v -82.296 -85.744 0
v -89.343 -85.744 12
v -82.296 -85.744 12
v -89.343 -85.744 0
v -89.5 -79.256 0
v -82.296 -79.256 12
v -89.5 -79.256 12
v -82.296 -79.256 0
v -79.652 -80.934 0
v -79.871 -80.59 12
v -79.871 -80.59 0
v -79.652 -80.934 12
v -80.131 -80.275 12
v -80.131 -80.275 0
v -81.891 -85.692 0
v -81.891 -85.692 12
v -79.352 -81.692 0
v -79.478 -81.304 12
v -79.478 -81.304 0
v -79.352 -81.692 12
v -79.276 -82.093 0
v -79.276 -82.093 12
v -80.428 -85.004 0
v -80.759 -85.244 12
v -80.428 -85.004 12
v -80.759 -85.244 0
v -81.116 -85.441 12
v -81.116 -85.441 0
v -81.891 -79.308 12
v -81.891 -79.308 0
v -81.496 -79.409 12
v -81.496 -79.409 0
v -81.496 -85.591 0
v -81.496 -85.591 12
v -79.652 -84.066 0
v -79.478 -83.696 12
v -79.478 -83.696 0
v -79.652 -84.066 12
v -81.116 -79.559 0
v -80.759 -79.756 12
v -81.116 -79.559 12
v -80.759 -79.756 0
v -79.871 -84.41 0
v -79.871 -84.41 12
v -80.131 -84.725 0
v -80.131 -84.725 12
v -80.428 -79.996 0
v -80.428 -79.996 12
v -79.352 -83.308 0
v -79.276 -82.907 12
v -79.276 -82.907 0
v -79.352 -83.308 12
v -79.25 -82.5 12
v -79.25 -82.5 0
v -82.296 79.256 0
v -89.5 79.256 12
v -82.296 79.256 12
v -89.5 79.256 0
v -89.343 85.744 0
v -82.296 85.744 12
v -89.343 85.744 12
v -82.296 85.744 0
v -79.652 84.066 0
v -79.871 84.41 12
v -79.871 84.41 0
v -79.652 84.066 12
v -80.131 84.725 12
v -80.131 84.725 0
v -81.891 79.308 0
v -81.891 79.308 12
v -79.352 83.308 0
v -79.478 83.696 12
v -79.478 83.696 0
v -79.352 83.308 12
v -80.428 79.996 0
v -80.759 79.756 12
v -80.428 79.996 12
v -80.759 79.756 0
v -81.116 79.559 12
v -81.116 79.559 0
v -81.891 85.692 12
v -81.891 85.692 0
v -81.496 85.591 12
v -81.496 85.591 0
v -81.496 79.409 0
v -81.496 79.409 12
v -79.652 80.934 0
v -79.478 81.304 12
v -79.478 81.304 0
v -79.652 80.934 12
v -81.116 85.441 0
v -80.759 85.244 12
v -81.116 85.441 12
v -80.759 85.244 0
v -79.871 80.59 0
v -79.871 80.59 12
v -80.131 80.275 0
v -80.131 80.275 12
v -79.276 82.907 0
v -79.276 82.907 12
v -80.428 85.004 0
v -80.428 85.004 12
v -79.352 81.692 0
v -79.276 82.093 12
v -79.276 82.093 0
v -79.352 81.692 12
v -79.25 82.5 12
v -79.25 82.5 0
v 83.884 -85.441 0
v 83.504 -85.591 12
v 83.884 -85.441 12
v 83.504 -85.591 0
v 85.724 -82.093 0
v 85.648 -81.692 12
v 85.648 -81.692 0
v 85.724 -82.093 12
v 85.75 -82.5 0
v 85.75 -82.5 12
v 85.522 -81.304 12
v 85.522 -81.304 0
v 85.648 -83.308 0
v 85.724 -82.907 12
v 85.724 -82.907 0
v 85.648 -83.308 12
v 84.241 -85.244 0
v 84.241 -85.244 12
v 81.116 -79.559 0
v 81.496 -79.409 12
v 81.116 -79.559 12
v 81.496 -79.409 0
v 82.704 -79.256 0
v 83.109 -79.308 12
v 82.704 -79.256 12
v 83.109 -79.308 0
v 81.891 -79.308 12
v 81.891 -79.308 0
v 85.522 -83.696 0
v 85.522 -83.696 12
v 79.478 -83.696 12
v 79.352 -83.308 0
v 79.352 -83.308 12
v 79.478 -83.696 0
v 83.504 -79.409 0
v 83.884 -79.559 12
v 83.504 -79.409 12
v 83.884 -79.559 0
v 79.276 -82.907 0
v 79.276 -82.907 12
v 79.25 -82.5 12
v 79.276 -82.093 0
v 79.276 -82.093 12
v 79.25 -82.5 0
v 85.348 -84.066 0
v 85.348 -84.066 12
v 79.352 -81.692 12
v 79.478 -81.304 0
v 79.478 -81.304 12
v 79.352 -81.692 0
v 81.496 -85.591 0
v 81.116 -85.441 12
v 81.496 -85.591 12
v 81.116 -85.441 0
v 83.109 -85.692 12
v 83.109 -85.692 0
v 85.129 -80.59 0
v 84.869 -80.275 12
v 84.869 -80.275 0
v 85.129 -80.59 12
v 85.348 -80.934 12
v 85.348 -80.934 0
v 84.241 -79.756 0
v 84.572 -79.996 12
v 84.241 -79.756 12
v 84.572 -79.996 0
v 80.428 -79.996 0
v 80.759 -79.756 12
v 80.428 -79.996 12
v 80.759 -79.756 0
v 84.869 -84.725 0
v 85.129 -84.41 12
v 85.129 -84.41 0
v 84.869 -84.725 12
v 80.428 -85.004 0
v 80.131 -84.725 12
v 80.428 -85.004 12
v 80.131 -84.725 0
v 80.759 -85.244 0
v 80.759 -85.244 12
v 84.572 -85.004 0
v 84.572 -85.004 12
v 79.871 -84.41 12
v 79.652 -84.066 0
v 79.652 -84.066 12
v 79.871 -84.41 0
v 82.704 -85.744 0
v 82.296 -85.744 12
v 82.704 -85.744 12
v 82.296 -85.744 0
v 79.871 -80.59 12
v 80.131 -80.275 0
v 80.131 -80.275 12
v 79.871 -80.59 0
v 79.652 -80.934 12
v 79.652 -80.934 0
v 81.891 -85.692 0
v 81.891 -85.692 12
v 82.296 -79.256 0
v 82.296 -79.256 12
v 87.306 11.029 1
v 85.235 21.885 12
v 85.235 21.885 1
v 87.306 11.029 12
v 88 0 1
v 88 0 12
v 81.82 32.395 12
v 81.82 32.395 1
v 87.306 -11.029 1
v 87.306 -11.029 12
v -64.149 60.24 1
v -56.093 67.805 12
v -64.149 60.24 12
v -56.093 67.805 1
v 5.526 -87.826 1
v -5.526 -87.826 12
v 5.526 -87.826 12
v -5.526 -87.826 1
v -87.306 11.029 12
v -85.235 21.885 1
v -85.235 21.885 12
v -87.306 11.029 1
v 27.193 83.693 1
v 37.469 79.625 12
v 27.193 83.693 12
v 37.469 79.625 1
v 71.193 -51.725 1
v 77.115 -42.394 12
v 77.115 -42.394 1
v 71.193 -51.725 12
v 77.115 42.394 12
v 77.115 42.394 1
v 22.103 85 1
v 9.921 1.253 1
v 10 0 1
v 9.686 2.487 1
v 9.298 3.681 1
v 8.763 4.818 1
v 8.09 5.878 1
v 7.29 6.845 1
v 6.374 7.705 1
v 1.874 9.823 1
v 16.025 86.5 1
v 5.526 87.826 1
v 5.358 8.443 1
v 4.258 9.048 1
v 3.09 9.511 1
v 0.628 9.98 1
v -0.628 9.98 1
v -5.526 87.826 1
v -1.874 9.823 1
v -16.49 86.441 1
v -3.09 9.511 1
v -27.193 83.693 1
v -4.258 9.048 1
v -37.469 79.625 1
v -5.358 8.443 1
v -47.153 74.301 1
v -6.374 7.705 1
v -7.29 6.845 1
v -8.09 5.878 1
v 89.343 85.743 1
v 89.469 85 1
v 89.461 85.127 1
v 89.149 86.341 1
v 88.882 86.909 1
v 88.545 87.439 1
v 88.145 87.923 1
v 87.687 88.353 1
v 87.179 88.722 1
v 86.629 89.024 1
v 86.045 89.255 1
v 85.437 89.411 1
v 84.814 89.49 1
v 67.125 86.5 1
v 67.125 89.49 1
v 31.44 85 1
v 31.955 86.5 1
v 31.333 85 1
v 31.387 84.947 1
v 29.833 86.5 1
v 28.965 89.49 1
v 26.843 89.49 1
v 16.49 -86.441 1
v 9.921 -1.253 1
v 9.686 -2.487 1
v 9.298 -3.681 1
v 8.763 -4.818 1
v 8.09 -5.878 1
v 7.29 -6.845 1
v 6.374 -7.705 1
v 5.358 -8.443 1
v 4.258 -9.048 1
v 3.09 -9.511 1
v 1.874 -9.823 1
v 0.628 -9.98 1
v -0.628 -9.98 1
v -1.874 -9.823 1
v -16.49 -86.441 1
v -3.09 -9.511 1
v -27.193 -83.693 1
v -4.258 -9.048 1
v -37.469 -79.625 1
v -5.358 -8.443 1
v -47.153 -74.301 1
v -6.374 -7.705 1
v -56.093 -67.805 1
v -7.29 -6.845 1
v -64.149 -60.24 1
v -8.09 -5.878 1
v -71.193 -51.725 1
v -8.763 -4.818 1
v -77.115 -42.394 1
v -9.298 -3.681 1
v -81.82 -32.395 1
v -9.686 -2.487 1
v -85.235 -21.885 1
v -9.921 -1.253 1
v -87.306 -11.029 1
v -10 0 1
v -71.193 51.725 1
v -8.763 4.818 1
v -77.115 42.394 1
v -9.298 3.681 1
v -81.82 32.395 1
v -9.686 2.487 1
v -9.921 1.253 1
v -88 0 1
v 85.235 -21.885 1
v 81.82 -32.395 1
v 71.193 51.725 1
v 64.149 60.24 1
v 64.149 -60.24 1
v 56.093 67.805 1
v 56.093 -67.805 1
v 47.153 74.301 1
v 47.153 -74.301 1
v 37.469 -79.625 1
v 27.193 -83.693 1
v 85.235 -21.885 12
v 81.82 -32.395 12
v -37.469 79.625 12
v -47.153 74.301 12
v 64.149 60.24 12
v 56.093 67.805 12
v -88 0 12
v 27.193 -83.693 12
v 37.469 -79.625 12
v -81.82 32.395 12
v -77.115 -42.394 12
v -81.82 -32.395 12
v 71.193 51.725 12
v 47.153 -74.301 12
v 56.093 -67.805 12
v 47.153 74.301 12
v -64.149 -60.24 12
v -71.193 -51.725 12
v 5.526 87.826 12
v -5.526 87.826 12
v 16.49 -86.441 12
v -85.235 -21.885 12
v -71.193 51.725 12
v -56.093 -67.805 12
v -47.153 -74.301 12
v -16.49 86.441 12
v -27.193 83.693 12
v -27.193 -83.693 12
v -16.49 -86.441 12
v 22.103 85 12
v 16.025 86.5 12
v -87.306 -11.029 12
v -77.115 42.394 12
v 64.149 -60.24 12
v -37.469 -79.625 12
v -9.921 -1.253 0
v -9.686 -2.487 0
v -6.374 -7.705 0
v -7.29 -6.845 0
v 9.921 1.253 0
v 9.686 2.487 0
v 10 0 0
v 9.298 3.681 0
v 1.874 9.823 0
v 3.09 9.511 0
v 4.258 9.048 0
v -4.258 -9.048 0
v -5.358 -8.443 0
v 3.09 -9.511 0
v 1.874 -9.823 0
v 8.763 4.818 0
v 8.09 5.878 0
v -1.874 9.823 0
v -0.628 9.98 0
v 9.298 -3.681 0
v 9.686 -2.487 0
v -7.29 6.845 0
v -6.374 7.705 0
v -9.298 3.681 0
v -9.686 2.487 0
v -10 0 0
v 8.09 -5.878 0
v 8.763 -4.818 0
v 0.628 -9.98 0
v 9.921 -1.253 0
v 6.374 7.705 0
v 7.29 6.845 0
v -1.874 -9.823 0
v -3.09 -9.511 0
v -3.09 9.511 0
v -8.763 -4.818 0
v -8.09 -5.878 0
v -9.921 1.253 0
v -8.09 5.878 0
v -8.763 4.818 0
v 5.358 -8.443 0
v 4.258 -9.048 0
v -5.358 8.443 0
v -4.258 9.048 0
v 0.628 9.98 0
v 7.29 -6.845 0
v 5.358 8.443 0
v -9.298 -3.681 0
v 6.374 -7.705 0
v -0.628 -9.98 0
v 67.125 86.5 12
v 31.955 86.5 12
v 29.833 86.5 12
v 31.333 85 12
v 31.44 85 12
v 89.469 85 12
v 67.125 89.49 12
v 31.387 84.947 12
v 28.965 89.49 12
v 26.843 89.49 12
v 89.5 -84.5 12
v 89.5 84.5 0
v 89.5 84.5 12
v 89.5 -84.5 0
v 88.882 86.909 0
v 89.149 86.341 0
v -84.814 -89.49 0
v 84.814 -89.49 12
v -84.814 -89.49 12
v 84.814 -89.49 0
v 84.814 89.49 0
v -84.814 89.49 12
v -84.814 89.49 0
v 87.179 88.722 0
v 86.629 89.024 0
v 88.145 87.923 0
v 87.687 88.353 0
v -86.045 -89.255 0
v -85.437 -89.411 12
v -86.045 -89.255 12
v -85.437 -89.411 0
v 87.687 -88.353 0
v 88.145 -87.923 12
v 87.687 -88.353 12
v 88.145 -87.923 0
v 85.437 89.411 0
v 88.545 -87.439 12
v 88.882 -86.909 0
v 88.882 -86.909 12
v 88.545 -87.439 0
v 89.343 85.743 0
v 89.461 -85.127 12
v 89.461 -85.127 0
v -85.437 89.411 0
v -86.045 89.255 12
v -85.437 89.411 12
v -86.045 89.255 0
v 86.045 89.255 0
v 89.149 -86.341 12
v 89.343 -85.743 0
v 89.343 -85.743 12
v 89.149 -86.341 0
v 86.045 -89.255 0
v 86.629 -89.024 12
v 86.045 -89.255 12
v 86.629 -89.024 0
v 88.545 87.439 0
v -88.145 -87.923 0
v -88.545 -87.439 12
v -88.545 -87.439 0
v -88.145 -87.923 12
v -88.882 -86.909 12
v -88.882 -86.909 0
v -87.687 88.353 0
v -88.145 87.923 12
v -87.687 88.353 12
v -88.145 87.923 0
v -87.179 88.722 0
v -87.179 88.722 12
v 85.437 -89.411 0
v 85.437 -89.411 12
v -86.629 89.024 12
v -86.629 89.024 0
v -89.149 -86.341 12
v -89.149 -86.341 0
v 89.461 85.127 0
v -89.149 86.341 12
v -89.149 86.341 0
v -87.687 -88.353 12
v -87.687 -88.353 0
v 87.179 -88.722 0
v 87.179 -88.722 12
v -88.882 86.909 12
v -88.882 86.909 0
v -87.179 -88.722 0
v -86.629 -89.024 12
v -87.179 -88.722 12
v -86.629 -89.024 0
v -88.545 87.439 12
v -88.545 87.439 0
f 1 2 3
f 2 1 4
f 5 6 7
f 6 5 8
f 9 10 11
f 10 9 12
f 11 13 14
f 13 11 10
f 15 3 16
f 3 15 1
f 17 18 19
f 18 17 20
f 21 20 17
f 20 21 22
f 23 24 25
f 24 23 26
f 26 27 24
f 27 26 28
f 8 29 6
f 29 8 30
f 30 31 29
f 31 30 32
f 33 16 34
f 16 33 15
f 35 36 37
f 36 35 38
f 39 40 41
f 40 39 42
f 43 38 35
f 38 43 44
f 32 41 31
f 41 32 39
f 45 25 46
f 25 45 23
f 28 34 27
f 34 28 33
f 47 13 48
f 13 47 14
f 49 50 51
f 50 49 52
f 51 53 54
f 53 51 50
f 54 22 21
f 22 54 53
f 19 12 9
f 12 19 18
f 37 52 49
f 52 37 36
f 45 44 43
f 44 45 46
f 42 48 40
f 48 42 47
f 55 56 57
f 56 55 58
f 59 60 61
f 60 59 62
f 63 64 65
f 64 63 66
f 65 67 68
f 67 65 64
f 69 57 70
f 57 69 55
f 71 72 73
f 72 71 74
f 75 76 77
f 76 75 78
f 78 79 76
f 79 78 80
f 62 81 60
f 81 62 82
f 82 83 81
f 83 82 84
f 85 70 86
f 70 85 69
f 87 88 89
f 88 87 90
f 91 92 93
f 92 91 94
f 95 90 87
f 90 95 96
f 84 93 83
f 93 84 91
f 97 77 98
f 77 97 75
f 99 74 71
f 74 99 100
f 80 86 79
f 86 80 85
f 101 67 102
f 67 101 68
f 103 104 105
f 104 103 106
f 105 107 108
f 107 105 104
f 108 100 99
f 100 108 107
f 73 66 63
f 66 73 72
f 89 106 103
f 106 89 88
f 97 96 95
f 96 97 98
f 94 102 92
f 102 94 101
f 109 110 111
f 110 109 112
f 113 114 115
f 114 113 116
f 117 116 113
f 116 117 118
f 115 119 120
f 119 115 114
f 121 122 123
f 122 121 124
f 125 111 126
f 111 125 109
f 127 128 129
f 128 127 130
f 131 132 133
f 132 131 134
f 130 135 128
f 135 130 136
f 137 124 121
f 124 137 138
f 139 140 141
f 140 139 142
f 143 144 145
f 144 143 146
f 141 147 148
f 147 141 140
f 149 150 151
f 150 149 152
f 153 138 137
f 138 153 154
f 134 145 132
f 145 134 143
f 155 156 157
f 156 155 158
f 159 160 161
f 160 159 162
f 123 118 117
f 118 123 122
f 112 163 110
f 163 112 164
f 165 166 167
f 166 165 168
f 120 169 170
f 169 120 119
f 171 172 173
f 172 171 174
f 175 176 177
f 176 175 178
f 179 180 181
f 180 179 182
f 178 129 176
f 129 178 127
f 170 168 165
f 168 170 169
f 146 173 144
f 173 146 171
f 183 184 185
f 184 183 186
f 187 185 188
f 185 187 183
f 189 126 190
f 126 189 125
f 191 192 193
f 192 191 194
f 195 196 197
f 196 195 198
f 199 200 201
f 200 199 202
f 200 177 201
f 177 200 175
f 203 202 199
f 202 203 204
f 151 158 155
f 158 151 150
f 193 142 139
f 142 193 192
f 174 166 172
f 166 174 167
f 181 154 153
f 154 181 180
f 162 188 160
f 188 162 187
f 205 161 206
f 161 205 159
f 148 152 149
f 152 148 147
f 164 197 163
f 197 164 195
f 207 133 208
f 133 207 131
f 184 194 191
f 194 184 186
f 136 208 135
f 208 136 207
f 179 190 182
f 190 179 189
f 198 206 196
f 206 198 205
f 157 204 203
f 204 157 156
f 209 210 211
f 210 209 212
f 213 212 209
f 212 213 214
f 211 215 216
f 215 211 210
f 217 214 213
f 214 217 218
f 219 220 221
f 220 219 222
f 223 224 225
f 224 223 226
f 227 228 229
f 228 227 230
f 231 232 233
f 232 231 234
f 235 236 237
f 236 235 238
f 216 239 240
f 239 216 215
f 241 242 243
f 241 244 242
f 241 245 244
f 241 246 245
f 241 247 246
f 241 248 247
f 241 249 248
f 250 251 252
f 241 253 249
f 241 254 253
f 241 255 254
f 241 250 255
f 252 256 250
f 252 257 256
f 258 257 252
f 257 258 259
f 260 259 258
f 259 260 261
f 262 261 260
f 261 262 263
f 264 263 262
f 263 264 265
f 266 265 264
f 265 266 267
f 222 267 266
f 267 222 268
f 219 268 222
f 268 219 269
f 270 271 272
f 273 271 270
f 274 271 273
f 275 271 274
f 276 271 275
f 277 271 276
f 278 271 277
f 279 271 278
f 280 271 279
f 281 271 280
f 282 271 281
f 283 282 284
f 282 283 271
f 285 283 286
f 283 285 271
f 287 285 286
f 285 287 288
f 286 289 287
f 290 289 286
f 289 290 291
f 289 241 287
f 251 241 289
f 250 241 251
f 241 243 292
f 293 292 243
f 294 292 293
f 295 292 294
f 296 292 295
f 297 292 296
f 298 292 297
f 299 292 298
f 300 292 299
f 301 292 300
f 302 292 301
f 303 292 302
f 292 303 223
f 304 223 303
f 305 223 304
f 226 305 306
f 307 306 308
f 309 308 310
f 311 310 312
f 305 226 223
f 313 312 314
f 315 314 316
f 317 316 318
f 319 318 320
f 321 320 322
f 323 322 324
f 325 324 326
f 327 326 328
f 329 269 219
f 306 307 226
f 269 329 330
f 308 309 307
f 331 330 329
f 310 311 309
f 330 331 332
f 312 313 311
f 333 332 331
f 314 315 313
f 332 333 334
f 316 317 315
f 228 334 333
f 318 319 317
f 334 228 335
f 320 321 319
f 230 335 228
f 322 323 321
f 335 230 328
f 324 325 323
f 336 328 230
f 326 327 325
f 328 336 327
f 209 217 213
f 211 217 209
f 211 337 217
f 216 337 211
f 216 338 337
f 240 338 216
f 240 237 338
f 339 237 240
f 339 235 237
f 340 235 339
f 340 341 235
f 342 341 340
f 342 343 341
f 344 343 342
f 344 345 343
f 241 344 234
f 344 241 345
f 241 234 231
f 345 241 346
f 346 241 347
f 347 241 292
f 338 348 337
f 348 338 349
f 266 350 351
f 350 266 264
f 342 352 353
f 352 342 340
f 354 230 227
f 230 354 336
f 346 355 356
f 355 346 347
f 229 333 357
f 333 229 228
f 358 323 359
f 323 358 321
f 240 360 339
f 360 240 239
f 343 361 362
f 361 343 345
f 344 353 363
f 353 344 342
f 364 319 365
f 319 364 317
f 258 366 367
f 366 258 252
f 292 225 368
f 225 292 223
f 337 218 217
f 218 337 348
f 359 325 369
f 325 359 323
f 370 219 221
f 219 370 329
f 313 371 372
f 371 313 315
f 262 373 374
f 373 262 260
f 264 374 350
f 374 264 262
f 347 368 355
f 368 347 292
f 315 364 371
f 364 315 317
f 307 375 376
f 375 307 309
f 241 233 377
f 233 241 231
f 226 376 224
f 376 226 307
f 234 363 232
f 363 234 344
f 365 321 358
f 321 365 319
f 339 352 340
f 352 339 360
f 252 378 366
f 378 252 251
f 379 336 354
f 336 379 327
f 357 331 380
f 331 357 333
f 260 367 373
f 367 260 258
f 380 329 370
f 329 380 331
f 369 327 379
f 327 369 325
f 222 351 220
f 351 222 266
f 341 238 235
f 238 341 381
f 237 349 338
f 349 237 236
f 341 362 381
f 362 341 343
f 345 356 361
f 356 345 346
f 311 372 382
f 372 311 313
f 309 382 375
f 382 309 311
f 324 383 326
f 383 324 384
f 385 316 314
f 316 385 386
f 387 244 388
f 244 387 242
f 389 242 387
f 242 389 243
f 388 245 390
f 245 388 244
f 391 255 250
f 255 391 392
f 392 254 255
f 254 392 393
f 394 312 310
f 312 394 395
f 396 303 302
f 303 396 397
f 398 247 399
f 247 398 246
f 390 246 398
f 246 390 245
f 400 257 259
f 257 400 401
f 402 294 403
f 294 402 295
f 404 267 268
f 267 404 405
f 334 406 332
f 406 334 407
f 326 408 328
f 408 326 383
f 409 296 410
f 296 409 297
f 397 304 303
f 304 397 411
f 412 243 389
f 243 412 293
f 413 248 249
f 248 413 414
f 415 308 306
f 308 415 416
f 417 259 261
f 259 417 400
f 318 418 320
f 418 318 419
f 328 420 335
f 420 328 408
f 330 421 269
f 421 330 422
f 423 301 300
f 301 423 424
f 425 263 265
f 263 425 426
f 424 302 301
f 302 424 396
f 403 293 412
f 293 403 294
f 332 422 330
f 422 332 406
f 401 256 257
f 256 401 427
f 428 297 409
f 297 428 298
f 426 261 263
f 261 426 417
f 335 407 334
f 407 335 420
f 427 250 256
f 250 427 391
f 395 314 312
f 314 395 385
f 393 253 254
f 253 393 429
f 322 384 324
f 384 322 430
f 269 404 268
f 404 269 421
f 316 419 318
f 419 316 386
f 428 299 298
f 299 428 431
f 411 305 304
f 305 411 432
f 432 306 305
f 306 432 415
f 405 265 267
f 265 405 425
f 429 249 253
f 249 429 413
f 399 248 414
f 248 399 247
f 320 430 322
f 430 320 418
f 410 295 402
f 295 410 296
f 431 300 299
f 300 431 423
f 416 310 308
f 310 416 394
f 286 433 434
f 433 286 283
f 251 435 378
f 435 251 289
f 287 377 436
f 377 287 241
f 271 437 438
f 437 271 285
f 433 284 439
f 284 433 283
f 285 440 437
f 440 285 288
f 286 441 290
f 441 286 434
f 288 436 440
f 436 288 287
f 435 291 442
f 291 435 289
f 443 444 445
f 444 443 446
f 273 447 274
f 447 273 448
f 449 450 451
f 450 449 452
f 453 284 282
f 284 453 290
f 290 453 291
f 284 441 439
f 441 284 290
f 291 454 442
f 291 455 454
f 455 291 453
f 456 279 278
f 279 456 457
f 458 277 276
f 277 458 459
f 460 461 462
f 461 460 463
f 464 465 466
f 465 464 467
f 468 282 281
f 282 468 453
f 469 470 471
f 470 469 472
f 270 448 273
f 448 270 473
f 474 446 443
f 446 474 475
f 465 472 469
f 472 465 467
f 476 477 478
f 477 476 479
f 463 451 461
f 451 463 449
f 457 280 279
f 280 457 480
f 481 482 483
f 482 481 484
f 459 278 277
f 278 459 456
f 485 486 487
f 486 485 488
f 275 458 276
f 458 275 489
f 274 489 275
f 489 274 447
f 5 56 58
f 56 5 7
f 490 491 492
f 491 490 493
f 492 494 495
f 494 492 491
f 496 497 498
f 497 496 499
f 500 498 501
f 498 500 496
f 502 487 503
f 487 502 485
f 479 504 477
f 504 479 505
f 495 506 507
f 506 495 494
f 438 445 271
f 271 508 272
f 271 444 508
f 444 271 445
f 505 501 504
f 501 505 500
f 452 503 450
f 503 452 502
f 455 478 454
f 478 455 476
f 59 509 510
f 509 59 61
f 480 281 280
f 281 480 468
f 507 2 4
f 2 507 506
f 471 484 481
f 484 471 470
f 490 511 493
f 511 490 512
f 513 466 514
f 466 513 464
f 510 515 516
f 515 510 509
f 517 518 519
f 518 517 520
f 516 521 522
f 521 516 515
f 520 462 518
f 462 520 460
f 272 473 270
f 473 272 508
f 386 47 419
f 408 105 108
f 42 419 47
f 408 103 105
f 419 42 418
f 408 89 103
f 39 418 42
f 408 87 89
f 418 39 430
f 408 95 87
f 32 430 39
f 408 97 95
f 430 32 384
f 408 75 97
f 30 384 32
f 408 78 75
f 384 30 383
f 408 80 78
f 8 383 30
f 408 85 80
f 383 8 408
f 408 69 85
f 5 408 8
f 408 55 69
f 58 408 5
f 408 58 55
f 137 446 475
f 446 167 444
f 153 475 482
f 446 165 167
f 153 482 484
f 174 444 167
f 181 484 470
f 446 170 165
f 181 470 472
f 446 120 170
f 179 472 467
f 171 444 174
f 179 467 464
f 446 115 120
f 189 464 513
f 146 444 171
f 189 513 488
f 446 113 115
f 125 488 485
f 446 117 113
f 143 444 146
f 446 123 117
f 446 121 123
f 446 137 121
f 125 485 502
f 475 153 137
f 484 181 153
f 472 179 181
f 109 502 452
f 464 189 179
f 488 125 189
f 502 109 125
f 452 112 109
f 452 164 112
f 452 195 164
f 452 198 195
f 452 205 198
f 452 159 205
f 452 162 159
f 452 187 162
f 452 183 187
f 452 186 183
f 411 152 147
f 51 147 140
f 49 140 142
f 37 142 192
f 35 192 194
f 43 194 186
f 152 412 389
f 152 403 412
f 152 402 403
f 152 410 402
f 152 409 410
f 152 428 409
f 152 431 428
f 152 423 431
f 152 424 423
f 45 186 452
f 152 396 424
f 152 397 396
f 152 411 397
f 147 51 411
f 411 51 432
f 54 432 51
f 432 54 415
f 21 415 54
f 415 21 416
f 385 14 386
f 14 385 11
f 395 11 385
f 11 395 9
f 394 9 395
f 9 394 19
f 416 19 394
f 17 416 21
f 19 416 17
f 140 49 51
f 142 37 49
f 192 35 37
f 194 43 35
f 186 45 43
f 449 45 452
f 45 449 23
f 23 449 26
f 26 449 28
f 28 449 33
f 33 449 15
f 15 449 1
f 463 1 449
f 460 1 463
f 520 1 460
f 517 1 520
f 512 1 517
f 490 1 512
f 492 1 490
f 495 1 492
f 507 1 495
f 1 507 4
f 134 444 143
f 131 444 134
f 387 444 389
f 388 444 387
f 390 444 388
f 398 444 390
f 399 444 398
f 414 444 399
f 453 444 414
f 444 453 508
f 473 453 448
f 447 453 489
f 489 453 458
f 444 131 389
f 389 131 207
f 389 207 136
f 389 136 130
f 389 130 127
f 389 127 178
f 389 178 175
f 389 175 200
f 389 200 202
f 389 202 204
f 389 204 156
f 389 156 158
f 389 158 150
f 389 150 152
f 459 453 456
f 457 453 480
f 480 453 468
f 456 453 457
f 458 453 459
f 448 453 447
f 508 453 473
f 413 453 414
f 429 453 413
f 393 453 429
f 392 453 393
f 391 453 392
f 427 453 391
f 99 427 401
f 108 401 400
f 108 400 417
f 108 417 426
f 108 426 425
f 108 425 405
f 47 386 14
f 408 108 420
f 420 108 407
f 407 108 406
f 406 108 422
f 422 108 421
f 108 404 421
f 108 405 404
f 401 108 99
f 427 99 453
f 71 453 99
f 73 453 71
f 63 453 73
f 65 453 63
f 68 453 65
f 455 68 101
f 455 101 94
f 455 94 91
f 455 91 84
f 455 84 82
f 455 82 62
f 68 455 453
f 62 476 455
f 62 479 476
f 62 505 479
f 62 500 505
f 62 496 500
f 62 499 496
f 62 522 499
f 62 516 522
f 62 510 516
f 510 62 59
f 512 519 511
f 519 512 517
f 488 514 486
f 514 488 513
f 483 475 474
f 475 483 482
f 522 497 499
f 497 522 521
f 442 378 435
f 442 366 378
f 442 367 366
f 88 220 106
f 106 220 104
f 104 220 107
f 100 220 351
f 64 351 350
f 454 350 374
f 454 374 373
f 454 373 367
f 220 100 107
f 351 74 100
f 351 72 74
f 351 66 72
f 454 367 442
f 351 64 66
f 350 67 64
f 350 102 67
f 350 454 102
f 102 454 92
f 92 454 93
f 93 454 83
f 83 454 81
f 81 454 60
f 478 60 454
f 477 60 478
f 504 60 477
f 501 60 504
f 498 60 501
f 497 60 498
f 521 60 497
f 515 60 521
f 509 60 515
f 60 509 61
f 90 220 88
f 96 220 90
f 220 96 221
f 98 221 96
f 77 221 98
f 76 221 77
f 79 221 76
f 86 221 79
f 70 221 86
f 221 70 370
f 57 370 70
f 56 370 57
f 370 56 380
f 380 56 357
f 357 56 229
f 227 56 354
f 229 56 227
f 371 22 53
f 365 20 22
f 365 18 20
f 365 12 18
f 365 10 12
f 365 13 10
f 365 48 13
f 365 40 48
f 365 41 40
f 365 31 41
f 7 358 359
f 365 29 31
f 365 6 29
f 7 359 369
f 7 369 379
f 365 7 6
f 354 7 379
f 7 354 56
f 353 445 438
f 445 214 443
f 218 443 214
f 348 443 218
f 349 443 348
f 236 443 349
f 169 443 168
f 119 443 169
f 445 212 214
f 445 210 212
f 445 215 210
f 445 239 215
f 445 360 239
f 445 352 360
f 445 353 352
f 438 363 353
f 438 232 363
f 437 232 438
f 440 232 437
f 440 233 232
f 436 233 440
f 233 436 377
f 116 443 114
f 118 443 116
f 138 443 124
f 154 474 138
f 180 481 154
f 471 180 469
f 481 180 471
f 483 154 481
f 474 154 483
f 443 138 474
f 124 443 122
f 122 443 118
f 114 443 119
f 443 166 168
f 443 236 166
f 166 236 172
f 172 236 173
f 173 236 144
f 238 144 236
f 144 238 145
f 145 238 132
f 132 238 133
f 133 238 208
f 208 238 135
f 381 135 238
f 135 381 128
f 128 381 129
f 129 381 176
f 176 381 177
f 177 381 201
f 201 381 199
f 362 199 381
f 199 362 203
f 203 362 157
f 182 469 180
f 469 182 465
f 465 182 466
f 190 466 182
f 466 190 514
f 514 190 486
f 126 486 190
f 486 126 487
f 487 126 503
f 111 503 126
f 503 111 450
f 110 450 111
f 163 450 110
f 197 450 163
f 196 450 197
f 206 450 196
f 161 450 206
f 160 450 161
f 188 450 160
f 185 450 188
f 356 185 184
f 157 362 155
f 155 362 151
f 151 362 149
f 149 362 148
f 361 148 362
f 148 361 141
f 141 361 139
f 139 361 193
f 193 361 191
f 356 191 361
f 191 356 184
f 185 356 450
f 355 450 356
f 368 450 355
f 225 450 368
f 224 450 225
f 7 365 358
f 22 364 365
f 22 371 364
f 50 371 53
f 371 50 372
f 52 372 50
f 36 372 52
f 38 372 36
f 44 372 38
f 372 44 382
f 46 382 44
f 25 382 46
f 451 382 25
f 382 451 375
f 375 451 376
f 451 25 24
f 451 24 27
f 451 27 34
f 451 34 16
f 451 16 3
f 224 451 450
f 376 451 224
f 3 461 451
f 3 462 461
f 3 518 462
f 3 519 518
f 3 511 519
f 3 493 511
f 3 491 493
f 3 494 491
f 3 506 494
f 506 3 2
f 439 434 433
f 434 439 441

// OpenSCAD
$fn = 50;


difference() {
	union() {
		translate(v = [0, 0, 0]) {
			rotate(a = [0, 0, 0]) {
				hull() {
					translate(v = [-84.5000000000, 84.5000000000, 0]) {
						rotate(a = [0, 0, 0]) {
							translate(v = [0, 0, 0]) {
								rotate(a = [0, 0, 0]) {
									cylinder(h = 12, r = 5);
								}
							}
						}
					}
					translate(v = [84.5000000000, 84.5000000000, 0]) {
						rotate(a = [0, 0, 0]) {
							translate(v = [0, 0, 0]) {
								rotate(a = [0, 0, 0]) {
									cylinder(h = 12, r = 5);
								}
							}
						}
					}
					translate(v = [-84.5000000000, -84.5000000000, 0]) {
						rotate(a = [0, 0, 0]) {
							translate(v = [0, 0, 0]) {
								rotate(a = [0, 0, 0]) {
									cylinder(h = 12, r = 5);
								}
							}
						}
					}
					translate(v = [84.5000000000, -84.5000000000, 0]) {
						rotate(a = [0, 0, 0]) {
							translate(v = [0, 0, 0]) {
								rotate(a = [0, 0, 0]) {
									cylinder(h = 12, r = 5);
								}
							}
						}
					}
				}
			}
		}
	}
	union() {
		translate(v = [-90.0000000000, -82.5000000000, -125]) {
			rotate(a = [0, 0, 0]) {
				hull() {
					translate(v = [7.5000000000, 0, 0]) {
						rotate(a = [0, 0, 0]) {
							translate(v = [0, 0, 0]) {
								rotate(a = [0, 0, 0]) {
									cylinder(h = 250, r = 3.2500000000);
								}
							}
						}
					}
					translate(v = [-7.5000000000, 0, 0]) {
						rotate(a = [0, 0, 0]) {
							translate(v = [0, 0, 0]) {
								rotate(a = [0, 0, 0]) {
									cylinder(h = 250, r = 3.2500000000);
								}
							}
						}
					}
				}
			}
		}
		translate(v = [-90.0000000000, 82.5000000000, -125]) {
			rotate(a = [0, 0, 0]) {
				hull() {
					translate(v = [7.5000000000, 0, 0]) {
						rotate(a = [0, 0, 0]) {
							translate(v = [0, 0, 0]) {
								rotate(a = [0, 0, 0]) {
									cylinder(h = 250, r = 3.2500000000);
								}
							}
						}
					}
					translate(v = [-7.5000000000, 0, 0]) {
						rotate(a = [0, 0, 0]) {
							translate(v = [0, 0, 0]) {
								rotate(a = [0, 0, 0]) {
									cylinder(h = 250, r = 3.2500000000);
								}
							}
						}
					}
				}
			}
		}
		translate(v = [82.5000000000, -82.5000000000, -125.0000000000]) {
			rotate(a = [0, 0, 0]) {
				cylinder(h = 250, r = 3.2500000000);
			}
		}
		translate(v = [0, 0, 1.0000000000]) {
			rotate(a = [0, 0, 0]) {
				cylinder(h = 14, r = 88.0000000000);
			}
		}
		translate(v = [0, 0, -6.0000000000]) {
			rotate(a = [0, 0, 0]) {
				cylinder(h = 12, r = 10.0000000000);
			}
		}
		translate(v = [0.0000000000, 85.0000000000, 1]) {
			rotate(a = [0, 0, 0]) {
				cube(size = [89.5000000000, 1.5000000000, 14]);
			}
		}
		translate(v = [67.1250000000, 85.0000000000, 1]) {
			rotate(a = [0, 0, 0]) {
				cube(size = [22.3750000000, 4.5000000000, 14]);
			}
		}
		translate(v = [26.0833333333, 90.2500000000, 1]) {
			rotate(a = [0, 0, -45]) {
				cube(size = [7.5000000000, 1.5000000000, 14]);
			}
		}
	}
}
